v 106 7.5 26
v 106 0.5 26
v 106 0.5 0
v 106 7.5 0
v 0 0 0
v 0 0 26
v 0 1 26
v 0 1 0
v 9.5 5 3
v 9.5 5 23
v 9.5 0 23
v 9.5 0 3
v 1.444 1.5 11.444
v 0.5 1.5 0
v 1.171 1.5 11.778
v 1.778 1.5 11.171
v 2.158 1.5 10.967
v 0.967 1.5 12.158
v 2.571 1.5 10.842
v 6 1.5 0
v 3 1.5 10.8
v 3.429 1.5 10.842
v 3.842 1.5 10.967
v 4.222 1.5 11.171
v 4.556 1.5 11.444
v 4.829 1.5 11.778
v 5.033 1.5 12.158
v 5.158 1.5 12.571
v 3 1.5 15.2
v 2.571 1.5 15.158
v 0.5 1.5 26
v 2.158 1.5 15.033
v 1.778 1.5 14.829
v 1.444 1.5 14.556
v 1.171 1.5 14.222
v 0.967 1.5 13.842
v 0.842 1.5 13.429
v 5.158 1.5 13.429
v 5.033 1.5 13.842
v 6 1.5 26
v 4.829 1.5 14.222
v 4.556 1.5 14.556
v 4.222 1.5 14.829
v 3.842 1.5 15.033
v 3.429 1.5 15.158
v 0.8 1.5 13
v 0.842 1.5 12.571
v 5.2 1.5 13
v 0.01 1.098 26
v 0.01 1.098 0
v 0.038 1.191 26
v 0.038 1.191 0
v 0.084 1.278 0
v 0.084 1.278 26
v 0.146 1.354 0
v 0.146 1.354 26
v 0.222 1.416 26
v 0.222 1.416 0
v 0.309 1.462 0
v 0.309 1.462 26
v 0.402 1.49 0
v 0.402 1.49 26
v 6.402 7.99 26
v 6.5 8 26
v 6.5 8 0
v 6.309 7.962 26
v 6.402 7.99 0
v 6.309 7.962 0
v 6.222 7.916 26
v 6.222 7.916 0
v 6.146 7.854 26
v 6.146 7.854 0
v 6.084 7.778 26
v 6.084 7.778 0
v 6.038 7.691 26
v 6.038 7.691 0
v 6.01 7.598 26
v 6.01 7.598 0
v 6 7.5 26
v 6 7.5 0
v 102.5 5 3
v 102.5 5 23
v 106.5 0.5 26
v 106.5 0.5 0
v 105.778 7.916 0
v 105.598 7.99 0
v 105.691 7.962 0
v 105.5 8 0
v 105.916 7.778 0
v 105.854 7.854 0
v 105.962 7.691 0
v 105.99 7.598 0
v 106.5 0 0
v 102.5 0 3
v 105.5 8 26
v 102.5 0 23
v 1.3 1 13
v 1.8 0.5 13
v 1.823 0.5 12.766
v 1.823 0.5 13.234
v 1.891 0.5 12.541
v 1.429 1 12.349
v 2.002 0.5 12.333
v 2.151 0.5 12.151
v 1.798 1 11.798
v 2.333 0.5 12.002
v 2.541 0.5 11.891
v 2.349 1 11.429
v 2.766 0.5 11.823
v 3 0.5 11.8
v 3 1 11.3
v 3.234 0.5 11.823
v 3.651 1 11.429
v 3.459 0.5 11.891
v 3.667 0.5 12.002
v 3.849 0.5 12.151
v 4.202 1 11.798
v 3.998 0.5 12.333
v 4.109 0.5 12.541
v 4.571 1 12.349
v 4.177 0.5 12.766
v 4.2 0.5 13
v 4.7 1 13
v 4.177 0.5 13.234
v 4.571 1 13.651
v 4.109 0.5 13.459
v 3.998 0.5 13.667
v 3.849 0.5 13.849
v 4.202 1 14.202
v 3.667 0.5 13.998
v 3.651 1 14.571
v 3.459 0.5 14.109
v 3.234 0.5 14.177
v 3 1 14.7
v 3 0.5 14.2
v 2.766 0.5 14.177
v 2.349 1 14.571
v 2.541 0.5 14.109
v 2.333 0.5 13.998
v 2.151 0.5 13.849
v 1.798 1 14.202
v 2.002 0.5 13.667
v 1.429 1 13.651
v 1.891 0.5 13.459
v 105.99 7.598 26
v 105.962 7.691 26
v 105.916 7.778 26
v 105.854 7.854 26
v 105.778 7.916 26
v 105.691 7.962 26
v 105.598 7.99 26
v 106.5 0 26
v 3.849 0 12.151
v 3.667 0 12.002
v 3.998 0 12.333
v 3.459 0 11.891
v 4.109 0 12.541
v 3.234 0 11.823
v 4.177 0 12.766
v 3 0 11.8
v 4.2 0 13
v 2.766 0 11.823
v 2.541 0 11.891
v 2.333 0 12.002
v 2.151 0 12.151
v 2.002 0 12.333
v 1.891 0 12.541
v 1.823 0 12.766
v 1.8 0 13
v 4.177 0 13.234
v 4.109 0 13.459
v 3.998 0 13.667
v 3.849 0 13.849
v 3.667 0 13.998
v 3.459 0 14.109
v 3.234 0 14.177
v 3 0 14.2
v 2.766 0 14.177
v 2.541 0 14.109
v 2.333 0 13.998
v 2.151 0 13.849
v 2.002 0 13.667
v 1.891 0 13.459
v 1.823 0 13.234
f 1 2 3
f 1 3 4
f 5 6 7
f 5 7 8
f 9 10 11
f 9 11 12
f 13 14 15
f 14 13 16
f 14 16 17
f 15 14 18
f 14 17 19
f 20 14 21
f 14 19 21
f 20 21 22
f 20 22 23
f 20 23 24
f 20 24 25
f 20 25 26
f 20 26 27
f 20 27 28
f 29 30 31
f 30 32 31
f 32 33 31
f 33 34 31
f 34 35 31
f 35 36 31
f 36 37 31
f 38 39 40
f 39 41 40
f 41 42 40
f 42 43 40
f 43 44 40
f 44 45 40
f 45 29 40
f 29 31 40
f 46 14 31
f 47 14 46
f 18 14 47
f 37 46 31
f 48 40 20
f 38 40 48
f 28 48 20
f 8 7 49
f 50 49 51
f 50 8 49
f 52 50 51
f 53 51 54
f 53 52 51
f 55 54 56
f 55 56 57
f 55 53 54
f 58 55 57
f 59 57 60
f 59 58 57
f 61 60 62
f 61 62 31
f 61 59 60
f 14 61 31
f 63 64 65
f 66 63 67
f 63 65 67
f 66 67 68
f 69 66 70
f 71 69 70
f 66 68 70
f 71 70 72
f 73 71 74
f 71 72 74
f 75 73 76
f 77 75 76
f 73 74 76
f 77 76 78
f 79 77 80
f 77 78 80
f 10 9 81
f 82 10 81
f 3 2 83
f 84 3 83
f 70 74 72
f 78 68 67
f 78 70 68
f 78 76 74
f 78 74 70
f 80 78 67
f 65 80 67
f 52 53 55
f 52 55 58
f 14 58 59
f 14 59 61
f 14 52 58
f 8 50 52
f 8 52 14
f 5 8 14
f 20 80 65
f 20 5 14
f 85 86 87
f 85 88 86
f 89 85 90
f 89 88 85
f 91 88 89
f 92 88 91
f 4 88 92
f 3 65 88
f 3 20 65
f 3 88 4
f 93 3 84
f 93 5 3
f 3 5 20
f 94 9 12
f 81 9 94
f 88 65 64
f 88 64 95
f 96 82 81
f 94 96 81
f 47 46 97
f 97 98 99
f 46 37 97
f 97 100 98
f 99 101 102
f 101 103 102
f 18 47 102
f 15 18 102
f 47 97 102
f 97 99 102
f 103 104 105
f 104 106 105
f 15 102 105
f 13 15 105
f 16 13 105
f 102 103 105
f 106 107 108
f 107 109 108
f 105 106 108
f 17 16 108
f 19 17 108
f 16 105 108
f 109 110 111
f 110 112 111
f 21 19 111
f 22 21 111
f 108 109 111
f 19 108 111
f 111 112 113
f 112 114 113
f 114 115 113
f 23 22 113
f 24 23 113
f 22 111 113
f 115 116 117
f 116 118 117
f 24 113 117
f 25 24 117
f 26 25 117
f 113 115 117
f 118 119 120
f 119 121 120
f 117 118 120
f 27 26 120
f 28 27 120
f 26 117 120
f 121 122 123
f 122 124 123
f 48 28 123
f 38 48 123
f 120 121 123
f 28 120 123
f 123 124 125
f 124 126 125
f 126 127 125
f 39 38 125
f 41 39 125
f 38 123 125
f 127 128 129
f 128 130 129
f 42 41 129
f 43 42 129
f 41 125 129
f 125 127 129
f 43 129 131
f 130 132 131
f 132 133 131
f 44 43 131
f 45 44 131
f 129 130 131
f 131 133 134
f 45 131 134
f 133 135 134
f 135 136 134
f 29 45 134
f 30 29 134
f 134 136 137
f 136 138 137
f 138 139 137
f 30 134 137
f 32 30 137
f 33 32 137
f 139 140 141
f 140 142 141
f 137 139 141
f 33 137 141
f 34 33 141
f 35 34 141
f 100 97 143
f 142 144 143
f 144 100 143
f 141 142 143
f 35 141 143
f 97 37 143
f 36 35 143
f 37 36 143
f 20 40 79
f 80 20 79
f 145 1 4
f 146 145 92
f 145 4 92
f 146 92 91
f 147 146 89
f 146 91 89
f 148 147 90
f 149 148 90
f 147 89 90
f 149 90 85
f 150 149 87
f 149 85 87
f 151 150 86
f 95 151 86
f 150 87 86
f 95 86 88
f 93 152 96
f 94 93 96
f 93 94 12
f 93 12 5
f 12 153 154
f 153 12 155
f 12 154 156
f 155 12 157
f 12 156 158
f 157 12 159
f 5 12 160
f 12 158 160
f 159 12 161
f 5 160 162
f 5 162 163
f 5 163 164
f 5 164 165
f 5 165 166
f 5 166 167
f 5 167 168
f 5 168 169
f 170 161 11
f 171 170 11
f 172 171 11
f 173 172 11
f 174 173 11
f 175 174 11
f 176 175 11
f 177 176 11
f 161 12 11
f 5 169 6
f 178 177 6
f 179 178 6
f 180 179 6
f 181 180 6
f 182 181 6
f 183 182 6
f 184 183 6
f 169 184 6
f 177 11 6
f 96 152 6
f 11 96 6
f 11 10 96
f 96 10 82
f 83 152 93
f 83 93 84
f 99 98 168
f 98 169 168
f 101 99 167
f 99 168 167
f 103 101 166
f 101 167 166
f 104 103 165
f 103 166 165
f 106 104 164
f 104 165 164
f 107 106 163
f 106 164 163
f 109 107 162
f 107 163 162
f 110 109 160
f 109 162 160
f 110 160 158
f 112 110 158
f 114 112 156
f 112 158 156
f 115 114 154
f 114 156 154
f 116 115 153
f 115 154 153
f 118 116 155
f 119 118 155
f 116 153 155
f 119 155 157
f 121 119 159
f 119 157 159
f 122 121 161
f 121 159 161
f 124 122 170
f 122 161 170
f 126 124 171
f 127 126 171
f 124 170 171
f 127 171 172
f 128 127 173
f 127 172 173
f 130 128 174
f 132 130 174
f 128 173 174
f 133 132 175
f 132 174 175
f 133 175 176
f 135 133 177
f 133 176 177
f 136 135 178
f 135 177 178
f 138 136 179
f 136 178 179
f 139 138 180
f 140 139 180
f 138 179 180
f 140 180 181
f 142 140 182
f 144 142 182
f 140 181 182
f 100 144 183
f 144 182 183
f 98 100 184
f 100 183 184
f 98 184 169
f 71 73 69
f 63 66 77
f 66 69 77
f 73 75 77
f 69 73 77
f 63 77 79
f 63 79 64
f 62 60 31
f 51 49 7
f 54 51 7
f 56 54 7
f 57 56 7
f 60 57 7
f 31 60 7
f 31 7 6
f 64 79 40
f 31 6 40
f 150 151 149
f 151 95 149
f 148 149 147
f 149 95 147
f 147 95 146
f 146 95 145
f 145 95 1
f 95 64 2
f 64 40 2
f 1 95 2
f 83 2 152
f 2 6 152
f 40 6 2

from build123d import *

# Parameters (mm, degrees)
SKETCH1_W                                           = 107
SKETCH1_H                                           = 26
BOSS_EXTRUDE1_DEPTH                                 = 8
SKETCH2_W                                           = 1
SKETCH2_H                                           = 7.5
SKETCH2_W_2                                         = 6
SKETCH2_H_2                                         = 6.5
CUT_EXTRUDE1_DEPTH                                  = 111.403804282
FILLET1_R                                           = 0.5
CSK_FOR_M2_COUNTERSUNK_FLAT_HEAD_SCREW1_D           = 2.4
CSK_FOR_M2_COUNTERSUNK_FLAT_HEAD_SCREW1_DEPTH       = 15
CSK_FOR_M2_COUNTERSUNK_FLAT_HEAD_SCREW1_CSINK_D     = 4.4
CSK_FOR_M2_COUNTERSUNK_FLAT_HEAD_SCREW1_CSINK_ANGLE = 90
CSK_FOR_M2_COUNTERSUNK_FLAT_HEAD_SCREW1_TIP         = 0.721032743
SKETCH14_W                                          = 97
SKETCH14_H                                          = 24
CUT_EXTRUDE7_DEPTH                                  = 111.403804282
SKETCH14_3_W                                        = 97
SKETCH14_3_H                                        = 24
BOSS_EXTRUDE3_DEPTH                                 = 1
SKETCH18_W                                          = 97
SKETCH18_H                                          = 24
CUT_EXTRUDE8_DEPTH                                  = 111.403804282
SKETCH20_W                                          = 97
SKETCH20_H                                          = 24
SKETCH20_W_2                                        = 93
SKETCH20_H_2                                        = 20
BOSS_EXTRUDE4_DEPTH                                 = 8
SKETCH20_2_W                                        = 97
SKETCH20_2_H                                        = 24
SKETCH20_2_W_2                                      = 93
SKETCH20_2_H_2                                      = 20
CUT_EXTRUDE9_DEPTH                                  = 3
SKETCH21_W                                          = 52
SKETCH21_H                                          = 2
BOSS_EXTRUDE5_DEPTH                                 = 5
SKETCH22_W                                          = 52
SKETCH22_H                                          = 2
BOSS_EXTRUDE6_DEPTH                                 = 5
SKETCH23_W                                          = 0.5
SKETCH23_H                                          = 16.612240618
CUT_EXTRUDE10_DEPTH                                 = 111.403804282
BOSS_EXTRUDE7_REACH                                 = 111.249
SKETCH25_W                                          = 2
SKETCH25_H                                          = 5
CUT_EXTRUDE11_REACH                                 = 64.258
SKETCH26_W                                          = 10
SKETCH26_H                                          = 2
SKETCH27_W                                          = 97
SKETCH27_H                                          = 24
BOSS_EXTRUDE8_DEPTH                                 = 3
SKETCH29_W                                          = 20
SKETCH29_H                                          = 5
CUT_EXTRUDE12_DEPTH                                 = 54


with BuildPart() as part:
    # Sketch1 → Boss-Extrude1 (new body)
    with BuildSketch(Plane(origin=(0, 0, 0), x_dir=(1, 0, 0), z_dir=(0, 1, 0))):
        with Locations((53.5, -13)):
            Rectangle(SKETCH1_W, SKETCH1_H)
    extrude(amount=BOSS_EXTRUDE1_DEPTH)

    # Sketch2 → Cut-Extrude1 (cut, through all)
    with BuildSketch(Plane.XY.offset(26)):
        with Locations((106.5, 4.25)):
            Rectangle(SKETCH2_W, SKETCH2_H)
        with Locations((3, 4.75)):
            Rectangle(SKETCH2_W_2, SKETCH2_H_2)
    extrude(amount=-CUT_EXTRUDE1_DEPTH, mode=Mode.SUBTRACT)

    # Fillet1
    fillet1_edges = [part.edges().sort_by_distance(p)[0] for p in [
        (106, 8, 13),
        (0, 1.5, 13),
        (6, 8, 13),
    ]]
    fillet(fillet1_edges, radius=FILLET1_R)

    # CSK for M2 Countersunk Flat Head Screw1
    with Locations(Plane(origin=(3, 1.5, 13), x_dir=(1, 0, 0), z_dir=(0, 1, 0))):
        with Locations((0, 0)):
            CounterSinkHole(CSK_FOR_M2_COUNTERSUNK_FLAT_HEAD_SCREW1_D / 2, CSK_FOR_M2_COUNTERSUNK_FLAT_HEAD_SCREW1_CSINK_D / 2, depth=CSK_FOR_M2_COUNTERSUNK_FLAT_HEAD_SCREW1_DEPTH, counter_sink_angle=CSK_FOR_M2_COUNTERSUNK_FLAT_HEAD_SCREW1_CSINK_ANGLE)
            with Locations((0, 0, -(CSK_FOR_M2_COUNTERSUNK_FLAT_HEAD_SCREW1_DEPTH + CSK_FOR_M2_COUNTERSUNK_FLAT_HEAD_SCREW1_TIP / 2))):  # 118° drill point
                Cone(0, CSK_FOR_M2_COUNTERSUNK_FLAT_HEAD_SCREW1_D / 2, CSK_FOR_M2_COUNTERSUNK_FLAT_HEAD_SCREW1_TIP, mode=Mode.SUBTRACT)

    # Sketch14 → Cut-Extrude7 (cut, through all)
    with BuildSketch(Plane(origin=(0, 8, 0), x_dir=(1, 0, 0), z_dir=(0, 1, 0))):
        with Locations((56, -13)):
            Rectangle(SKETCH14_W, SKETCH14_H)
    extrude(amount=-CUT_EXTRUDE7_DEPTH, mode=Mode.SUBTRACT)

    # Sketch14<3> → Boss-Extrude3 (add)
    with BuildSketch(Plane(origin=(0, 8, 0), x_dir=(1, 0, 0), z_dir=(0, 1, 0))):
        with Locations((56, -13)):
            Rectangle(SKETCH14_3_W, SKETCH14_3_H)
    extrude(amount=-BOSS_EXTRUDE3_DEPTH)

    # Sketch18 → Cut-Extrude8 (cut, through all)
    with BuildSketch(Plane(origin=(0, 0, 0), x_dir=(1, 0, 0), z_dir=(0, 1, 0))):
        with Locations((56, -13)):
            Rectangle(SKETCH18_W, SKETCH18_H)
    extrude(amount=CUT_EXTRUDE8_DEPTH, mode=Mode.SUBTRACT)

    # Sketch20 → Boss-Extrude4 (add)
    with BuildSketch(Plane(origin=(0, 8, 0), x_dir=(1, 0, 0), z_dir=(0, 1, 0))):
        with Locations((56, -13)):
            Rectangle(SKETCH20_W, SKETCH20_H)
        with Locations((56, -13)):
            Rectangle(SKETCH20_W_2, SKETCH20_H_2, mode=Mode.SUBTRACT)
    extrude(amount=-BOSS_EXTRUDE4_DEPTH)

    # Sketch20<2> → Cut-Extrude9 (cut)
    with BuildSketch(Plane(origin=(0, 8, 0), x_dir=(1, 0, 0), z_dir=(0, 1, 0))):
        with Locations((56, -13)):
            Rectangle(SKETCH20_2_W, SKETCH20_2_H)
        with Locations((56, -13)):
            Rectangle(SKETCH20_2_W_2, SKETCH20_2_H_2, mode=Mode.SUBTRACT)
    extrude(amount=-CUT_EXTRUDE9_DEPTH, mode=Mode.SUBTRACT)

    # Sketch21 → Boss-Extrude5 (add)
    with BuildSketch(Plane.XY.offset(3)):
        with Locations((76.5, 1)):
            Rectangle(SKETCH21_W, SKETCH21_H)
    extrude(amount=BOSS_EXTRUDE5_DEPTH)

    # Sketch22 → Boss-Extrude6 (add)
    with BuildSketch(Plane(origin=(0, 0, 23), x_dir=(-1, 0, 0), z_dir=(0, 0, -1))):
        with Locations((-76.5, 1)):
            Rectangle(SKETCH22_W, SKETCH22_H)
    extrude(amount=BOSS_EXTRUDE6_DEPTH)

    # Sketch23 → Cut-Extrude10 (cut, through all)
    with BuildSketch(Plane.XY.offset(26)):
        with Locations((106.75, 8.306120309)):
            Rectangle(SKETCH23_W, SKETCH23_H)
    extrude(amount=-CUT_EXTRUDE10_DEPTH, mode=Mode.SUBTRACT)

    # Sketch25 → Boss-Extrude7 (add, up to next)
    with BuildSketch(Plane(origin=(0, 0, 23), x_dir=(-1, 0, 0), z_dir=(0, 0, -1)), mode=Mode.PRIVATE) as boss_extrude7_sk1:
        with Locations((-49.5, 2.5)):
            Rectangle(SKETCH25_W, SKETCH25_H)
    boss_extrude7_tool1 = extrude(boss_extrude7_sk1.sketch, amount=BOSS_EXTRUDE7_REACH, mode=Mode.PRIVATE) - part.part
    add(boss_extrude7_tool1.solids().sort_by_distance((49.5, 2.5, 23))[0])

    # Sketch26 → Cut-Extrude11 (cut, up to next)
    with BuildSketch(Plane(origin=(50.5, 0, 0), x_dir=(0, 0, -1), z_dir=(1, 0, 0)), mode=Mode.PRIVATE) as cut_extrude11_sk1:
        with Locations((-13, 1)):
            Rectangle(SKETCH26_W, SKETCH26_H)
    cut_extrude11_tool1 = extrude(cut_extrude11_sk1.sketch, amount=-CUT_EXTRUDE11_REACH, mode=Mode.PRIVATE) & part.part
    add(cut_extrude11_tool1.solids().sort_by_distance((50.5, 1, 13))[0], mode=Mode.SUBTRACT)

    # Sketch27 → Boss-Extrude8 (add)
    with BuildSketch(Plane(origin=(0, 5, 0), x_dir=(1, 0, 0), z_dir=(0, 1, 0))):
        with Locations((56, -13)):
            Rectangle(SKETCH27_W, SKETCH27_H)
    extrude(amount=BOSS_EXTRUDE8_DEPTH)

    # Sketch29 → Cut-Extrude12 (cut)
    with BuildSketch(Plane.ZY.offset(-48.5)):
        with Locations((13, 2.5)):
            Rectangle(SKETCH29_W, SKETCH29_H)
    extrude(amount=-CUT_EXTRUDE12_DEPTH, mode=Mode.SUBTRACT)


solid = part.part
